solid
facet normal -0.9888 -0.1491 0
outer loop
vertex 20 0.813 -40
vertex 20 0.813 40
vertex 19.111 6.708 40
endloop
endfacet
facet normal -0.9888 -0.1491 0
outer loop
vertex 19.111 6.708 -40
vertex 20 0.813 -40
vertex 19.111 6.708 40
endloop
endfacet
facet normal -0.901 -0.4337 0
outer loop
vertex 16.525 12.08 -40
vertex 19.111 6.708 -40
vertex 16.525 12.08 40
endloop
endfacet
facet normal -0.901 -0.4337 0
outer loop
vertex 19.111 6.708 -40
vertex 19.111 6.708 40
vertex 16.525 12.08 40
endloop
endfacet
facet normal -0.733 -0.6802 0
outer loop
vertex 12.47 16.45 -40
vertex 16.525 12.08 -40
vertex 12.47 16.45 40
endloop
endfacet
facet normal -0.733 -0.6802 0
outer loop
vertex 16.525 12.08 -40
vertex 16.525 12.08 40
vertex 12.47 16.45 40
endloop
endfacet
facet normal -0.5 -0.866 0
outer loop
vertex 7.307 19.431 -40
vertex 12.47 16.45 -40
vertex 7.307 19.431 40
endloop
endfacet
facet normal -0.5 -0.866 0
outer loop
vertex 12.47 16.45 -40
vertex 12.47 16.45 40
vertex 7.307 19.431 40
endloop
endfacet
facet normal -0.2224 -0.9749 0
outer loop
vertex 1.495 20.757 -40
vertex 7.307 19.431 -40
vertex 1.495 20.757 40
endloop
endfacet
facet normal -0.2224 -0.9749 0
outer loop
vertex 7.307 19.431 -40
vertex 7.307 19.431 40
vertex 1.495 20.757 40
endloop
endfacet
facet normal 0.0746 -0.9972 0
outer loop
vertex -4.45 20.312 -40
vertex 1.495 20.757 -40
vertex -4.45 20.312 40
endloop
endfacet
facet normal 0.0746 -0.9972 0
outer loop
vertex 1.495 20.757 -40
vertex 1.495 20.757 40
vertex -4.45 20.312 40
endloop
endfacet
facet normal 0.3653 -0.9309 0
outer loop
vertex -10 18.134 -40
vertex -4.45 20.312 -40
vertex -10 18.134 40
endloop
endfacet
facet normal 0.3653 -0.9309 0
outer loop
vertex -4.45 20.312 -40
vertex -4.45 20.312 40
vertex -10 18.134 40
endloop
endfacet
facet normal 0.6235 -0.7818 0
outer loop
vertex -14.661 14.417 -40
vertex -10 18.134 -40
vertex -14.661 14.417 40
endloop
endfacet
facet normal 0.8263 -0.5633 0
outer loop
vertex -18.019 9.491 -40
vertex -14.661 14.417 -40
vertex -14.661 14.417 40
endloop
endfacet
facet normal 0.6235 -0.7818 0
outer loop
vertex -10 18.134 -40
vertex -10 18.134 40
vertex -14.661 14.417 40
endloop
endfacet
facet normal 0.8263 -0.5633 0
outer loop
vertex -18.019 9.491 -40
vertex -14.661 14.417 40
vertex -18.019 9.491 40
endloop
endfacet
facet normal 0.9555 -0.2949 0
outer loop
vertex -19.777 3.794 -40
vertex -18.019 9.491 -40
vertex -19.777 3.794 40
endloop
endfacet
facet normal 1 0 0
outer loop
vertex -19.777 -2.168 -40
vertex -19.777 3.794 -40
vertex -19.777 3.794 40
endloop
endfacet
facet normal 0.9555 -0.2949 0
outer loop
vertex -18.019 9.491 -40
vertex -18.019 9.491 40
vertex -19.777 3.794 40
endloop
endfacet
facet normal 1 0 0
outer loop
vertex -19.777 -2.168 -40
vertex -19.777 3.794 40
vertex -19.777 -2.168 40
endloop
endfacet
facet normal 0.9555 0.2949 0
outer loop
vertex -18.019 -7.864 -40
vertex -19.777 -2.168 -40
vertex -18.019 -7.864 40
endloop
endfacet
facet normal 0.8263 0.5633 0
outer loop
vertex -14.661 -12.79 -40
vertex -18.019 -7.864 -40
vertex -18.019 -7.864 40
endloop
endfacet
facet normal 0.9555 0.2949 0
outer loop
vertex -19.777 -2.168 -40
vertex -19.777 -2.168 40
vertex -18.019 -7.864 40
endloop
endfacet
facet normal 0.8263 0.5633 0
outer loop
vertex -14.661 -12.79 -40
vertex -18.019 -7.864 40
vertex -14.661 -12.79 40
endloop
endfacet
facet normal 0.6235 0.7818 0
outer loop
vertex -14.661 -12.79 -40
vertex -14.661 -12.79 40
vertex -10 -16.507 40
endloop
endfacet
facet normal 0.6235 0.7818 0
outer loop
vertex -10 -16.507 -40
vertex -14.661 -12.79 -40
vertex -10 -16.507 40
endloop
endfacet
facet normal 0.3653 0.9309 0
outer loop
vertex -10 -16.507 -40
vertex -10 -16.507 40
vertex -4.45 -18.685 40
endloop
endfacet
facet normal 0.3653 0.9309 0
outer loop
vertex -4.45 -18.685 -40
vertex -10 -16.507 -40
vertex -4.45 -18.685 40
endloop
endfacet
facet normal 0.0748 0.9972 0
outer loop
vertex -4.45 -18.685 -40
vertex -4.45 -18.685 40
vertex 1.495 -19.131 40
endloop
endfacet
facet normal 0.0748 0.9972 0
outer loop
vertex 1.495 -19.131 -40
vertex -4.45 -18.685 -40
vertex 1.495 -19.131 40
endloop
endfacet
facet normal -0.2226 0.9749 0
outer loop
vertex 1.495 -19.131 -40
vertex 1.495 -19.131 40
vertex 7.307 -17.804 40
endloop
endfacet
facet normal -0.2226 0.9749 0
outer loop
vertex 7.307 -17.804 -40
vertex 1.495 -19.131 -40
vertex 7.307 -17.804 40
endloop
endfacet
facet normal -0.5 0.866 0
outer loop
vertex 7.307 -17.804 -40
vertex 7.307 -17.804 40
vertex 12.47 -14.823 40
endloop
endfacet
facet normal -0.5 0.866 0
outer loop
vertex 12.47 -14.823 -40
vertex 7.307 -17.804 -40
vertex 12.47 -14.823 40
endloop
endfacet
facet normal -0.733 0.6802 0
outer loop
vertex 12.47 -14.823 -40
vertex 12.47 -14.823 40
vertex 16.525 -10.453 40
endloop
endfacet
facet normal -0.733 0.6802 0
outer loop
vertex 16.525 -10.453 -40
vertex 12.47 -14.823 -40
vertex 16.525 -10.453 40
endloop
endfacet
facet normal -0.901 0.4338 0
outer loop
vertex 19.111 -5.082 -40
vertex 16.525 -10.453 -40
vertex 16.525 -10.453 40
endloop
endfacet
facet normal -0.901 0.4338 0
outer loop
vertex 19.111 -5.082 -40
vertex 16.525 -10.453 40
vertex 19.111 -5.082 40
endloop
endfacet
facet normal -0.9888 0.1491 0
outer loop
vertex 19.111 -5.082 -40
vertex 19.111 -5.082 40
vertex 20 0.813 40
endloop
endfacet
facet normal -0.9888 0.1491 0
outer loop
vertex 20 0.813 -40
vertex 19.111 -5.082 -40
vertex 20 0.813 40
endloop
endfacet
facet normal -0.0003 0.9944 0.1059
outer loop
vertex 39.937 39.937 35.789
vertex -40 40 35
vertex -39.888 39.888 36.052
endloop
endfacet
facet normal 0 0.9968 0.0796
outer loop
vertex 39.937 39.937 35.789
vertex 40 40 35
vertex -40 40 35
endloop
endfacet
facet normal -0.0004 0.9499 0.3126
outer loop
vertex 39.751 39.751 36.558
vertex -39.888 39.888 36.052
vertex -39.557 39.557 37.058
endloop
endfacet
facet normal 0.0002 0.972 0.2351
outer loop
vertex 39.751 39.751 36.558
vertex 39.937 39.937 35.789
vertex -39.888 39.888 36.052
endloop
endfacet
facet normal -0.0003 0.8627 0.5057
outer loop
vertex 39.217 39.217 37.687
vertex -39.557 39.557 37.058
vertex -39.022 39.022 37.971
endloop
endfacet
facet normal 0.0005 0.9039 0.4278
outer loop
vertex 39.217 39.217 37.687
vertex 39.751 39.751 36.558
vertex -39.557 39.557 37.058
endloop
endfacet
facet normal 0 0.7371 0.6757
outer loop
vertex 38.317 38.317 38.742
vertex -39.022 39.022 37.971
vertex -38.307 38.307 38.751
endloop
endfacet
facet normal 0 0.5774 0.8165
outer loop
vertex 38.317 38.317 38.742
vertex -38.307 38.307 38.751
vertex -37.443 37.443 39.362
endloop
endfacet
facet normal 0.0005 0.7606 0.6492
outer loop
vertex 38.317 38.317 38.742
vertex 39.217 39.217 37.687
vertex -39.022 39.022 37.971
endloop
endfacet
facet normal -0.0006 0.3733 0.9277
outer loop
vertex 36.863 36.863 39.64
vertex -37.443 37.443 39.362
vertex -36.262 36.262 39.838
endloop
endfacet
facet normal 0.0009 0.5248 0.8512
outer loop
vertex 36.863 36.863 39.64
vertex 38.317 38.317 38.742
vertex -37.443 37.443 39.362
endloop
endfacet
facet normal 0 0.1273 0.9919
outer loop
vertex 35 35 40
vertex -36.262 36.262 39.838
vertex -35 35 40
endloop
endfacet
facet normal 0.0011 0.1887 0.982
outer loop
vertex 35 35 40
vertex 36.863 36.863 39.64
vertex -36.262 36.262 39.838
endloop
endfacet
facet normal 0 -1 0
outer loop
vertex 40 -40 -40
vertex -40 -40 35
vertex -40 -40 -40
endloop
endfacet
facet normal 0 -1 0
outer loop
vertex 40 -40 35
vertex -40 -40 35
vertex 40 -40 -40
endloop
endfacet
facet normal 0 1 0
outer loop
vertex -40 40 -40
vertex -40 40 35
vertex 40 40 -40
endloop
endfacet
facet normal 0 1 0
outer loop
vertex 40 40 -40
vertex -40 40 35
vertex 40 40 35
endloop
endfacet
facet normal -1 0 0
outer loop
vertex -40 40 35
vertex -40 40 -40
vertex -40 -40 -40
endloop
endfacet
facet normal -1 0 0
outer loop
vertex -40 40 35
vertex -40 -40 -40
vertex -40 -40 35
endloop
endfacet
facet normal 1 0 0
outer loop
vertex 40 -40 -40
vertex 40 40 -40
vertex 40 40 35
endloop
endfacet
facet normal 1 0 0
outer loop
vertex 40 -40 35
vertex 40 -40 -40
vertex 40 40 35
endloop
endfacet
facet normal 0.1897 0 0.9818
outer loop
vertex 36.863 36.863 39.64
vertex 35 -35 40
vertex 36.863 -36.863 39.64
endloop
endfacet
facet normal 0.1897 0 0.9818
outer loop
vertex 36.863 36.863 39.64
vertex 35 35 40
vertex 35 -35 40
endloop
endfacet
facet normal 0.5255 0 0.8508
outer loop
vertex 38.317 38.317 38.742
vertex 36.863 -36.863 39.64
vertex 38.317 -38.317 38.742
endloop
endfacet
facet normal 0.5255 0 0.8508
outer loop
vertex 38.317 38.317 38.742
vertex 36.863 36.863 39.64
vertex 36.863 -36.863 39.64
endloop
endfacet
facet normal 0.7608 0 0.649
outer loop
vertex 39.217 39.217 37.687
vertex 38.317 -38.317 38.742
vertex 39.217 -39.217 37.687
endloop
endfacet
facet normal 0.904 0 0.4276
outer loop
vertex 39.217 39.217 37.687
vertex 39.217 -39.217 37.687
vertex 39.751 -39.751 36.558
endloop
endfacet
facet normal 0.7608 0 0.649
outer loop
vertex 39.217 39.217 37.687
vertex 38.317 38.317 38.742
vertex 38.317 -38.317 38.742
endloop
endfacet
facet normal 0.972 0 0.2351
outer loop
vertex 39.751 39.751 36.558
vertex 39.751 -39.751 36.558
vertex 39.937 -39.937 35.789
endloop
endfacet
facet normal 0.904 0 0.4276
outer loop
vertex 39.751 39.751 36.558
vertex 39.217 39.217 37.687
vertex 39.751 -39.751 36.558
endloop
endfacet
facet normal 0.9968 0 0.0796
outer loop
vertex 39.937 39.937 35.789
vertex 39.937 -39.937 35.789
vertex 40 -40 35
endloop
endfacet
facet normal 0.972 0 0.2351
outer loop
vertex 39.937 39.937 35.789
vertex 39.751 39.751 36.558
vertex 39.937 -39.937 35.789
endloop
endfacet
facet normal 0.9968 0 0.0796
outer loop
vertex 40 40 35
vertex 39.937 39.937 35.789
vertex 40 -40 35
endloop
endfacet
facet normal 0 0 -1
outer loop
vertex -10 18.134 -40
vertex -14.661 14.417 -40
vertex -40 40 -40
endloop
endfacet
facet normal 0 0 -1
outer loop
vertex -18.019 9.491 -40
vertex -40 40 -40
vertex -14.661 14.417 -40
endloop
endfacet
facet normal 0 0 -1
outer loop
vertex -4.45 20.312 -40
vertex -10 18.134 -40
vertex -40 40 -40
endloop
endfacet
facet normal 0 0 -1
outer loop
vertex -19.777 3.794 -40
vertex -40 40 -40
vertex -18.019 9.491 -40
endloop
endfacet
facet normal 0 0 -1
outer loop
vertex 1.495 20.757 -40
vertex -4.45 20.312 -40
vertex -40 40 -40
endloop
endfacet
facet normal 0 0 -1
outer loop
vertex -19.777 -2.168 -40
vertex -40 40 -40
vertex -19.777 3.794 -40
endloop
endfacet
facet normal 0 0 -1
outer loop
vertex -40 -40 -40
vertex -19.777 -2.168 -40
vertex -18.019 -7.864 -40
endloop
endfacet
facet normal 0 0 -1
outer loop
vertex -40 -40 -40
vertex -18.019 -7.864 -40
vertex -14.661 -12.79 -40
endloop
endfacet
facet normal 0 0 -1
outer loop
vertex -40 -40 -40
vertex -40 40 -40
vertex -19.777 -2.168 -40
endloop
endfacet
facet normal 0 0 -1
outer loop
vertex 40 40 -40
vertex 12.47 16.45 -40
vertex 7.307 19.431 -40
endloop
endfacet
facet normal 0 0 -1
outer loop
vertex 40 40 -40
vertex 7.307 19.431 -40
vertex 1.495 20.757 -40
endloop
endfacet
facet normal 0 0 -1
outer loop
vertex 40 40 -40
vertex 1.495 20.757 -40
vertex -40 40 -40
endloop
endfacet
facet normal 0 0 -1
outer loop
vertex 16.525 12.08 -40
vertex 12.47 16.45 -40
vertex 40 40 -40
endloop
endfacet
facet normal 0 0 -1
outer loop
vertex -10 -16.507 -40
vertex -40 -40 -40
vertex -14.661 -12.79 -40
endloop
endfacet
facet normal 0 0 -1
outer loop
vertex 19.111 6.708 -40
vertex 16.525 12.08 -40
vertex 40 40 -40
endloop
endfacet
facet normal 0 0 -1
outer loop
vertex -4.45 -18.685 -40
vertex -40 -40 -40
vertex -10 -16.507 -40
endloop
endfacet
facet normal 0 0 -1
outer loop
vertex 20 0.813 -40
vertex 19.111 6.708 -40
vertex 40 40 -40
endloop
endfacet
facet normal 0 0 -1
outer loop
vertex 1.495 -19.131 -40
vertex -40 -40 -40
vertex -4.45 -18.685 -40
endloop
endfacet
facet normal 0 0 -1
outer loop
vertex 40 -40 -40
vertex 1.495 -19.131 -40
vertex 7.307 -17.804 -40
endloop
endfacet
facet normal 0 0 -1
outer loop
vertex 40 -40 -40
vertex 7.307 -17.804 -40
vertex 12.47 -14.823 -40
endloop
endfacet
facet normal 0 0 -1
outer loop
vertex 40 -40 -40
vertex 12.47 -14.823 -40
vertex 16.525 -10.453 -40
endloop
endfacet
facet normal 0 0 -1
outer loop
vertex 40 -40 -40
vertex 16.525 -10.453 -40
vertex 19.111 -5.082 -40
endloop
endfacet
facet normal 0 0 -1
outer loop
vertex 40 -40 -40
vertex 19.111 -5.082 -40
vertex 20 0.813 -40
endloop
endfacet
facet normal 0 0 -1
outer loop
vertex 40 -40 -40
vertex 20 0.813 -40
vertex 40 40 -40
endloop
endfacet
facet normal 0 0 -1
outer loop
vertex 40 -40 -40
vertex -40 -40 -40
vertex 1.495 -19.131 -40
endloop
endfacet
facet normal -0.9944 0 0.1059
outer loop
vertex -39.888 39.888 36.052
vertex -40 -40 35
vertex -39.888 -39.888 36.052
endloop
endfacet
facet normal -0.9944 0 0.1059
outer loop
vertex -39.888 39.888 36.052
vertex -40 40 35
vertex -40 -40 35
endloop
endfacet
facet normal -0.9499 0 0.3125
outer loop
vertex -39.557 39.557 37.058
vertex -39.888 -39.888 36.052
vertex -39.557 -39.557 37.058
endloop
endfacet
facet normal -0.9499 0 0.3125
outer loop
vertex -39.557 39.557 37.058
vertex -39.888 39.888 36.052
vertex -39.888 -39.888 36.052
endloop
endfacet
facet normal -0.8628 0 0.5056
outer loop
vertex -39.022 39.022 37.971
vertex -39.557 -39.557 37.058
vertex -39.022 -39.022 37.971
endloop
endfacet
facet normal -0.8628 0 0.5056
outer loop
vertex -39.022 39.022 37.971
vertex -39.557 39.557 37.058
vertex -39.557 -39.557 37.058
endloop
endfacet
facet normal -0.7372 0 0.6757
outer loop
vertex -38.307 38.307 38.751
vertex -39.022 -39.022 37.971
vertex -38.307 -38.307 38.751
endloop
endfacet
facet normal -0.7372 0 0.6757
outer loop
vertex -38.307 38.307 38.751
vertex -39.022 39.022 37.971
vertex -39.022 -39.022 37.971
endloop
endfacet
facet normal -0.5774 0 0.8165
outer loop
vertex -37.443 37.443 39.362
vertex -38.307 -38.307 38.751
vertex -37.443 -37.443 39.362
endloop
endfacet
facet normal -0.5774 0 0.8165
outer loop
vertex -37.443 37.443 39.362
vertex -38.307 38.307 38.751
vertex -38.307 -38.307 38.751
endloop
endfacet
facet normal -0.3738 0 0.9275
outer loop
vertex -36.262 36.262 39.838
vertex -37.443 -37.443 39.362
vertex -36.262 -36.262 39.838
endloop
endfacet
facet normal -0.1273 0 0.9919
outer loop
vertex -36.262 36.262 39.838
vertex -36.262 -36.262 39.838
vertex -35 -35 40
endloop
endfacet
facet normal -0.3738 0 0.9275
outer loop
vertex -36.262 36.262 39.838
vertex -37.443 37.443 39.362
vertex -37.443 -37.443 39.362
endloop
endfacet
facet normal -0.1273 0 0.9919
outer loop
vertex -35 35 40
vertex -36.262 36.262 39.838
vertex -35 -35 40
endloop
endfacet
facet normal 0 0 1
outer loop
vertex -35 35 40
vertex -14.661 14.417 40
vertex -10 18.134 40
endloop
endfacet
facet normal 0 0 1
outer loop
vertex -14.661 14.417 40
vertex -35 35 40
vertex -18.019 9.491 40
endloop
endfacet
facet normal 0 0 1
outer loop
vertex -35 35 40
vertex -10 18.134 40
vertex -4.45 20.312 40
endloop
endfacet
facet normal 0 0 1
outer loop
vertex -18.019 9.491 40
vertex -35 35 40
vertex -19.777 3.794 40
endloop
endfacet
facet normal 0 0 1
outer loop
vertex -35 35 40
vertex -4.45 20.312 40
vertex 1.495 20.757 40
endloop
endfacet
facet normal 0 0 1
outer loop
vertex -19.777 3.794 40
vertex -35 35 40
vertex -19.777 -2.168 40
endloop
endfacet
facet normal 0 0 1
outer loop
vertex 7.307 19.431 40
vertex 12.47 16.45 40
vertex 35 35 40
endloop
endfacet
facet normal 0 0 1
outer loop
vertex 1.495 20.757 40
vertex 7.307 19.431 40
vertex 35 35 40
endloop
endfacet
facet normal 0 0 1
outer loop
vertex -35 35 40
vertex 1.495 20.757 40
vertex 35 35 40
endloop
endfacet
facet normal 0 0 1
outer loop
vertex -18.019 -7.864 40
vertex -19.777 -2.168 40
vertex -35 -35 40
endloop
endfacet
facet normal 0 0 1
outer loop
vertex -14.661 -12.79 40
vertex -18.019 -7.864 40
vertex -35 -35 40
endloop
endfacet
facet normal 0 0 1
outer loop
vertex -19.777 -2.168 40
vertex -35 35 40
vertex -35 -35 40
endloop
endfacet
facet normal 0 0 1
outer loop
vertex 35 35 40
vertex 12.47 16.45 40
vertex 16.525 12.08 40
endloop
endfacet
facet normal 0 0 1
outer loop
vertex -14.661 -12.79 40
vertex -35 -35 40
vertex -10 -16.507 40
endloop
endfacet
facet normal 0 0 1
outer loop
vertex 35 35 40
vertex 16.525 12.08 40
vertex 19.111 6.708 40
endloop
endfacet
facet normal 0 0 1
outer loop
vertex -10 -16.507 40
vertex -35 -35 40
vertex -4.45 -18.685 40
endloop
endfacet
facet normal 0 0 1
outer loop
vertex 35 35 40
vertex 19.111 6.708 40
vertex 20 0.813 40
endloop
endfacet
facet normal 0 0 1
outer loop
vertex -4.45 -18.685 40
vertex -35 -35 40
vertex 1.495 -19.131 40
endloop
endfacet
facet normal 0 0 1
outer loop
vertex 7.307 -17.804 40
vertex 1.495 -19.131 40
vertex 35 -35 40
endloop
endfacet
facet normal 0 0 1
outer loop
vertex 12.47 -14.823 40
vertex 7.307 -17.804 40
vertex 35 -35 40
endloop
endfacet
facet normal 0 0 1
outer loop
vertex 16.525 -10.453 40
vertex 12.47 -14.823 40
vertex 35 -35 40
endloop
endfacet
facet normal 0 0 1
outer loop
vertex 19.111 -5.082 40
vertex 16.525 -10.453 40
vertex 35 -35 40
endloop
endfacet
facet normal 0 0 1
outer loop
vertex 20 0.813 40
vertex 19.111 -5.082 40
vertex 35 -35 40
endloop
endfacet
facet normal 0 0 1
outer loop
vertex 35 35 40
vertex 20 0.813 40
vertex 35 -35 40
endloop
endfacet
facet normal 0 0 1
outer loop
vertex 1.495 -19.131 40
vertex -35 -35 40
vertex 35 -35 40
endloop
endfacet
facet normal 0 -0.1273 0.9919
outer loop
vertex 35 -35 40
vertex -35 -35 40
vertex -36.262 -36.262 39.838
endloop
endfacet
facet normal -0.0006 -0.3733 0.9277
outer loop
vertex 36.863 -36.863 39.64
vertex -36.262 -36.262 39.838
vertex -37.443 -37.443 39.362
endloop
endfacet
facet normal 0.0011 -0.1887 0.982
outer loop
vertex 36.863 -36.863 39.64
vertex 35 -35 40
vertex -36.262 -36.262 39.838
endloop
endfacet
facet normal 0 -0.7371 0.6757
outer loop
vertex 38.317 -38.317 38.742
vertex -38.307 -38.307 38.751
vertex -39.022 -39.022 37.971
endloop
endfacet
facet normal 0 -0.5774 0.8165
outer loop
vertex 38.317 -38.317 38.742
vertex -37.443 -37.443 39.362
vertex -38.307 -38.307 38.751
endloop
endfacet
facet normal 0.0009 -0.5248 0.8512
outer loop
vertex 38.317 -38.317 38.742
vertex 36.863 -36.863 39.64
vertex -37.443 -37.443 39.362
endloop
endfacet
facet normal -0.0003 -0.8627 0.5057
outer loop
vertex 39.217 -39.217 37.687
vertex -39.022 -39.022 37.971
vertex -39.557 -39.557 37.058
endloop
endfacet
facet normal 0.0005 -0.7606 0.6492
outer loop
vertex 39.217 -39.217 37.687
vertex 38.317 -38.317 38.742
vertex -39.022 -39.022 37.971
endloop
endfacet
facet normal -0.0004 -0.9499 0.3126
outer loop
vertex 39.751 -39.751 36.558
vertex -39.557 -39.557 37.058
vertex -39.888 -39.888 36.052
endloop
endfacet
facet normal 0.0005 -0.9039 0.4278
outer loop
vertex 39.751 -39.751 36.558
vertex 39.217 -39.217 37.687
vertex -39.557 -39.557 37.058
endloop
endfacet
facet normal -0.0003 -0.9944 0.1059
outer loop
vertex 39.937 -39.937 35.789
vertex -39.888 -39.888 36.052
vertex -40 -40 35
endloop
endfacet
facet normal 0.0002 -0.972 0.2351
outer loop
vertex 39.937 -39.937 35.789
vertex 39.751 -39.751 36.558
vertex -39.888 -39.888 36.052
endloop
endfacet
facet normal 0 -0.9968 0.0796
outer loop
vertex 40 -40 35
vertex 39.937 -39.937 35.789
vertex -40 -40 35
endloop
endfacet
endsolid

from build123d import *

# Parameters (mm, degrees)
F0_W     = 80
F0_H     = 80
F1_DEPTH = 40
F2_R     = 20
F3_DEPTH = 80.001
F4_R     = 5


with BuildPart() as f1:
    # F0 (on Front) → F1 (new body, symmetric)
    with BuildSketch(Plane.XZ):
        Rectangle(F0_W, F0_H)
    extrude(amount=F1_DEPTH, both=True)

    # F2 (on face) → F3 (cut, through all)
    with BuildSketch(Plane.XY.offset(40)):
        with Locations((0, 0.813212)):
            Circle(F2_R)
    extrude(amount=-F3_DEPTH, mode=Mode.SUBTRACT)

    # F4
    f4_edges = [f1.edges().sort_by_distance(p)[0] for p in [
        (-40, 0, 40),
        (0, -40, 40),
        (40, 0, 40),
        (0, 40, 40),
    ]]
    fillet(f4_edges, radius=F4_R)


solid = f1.part
